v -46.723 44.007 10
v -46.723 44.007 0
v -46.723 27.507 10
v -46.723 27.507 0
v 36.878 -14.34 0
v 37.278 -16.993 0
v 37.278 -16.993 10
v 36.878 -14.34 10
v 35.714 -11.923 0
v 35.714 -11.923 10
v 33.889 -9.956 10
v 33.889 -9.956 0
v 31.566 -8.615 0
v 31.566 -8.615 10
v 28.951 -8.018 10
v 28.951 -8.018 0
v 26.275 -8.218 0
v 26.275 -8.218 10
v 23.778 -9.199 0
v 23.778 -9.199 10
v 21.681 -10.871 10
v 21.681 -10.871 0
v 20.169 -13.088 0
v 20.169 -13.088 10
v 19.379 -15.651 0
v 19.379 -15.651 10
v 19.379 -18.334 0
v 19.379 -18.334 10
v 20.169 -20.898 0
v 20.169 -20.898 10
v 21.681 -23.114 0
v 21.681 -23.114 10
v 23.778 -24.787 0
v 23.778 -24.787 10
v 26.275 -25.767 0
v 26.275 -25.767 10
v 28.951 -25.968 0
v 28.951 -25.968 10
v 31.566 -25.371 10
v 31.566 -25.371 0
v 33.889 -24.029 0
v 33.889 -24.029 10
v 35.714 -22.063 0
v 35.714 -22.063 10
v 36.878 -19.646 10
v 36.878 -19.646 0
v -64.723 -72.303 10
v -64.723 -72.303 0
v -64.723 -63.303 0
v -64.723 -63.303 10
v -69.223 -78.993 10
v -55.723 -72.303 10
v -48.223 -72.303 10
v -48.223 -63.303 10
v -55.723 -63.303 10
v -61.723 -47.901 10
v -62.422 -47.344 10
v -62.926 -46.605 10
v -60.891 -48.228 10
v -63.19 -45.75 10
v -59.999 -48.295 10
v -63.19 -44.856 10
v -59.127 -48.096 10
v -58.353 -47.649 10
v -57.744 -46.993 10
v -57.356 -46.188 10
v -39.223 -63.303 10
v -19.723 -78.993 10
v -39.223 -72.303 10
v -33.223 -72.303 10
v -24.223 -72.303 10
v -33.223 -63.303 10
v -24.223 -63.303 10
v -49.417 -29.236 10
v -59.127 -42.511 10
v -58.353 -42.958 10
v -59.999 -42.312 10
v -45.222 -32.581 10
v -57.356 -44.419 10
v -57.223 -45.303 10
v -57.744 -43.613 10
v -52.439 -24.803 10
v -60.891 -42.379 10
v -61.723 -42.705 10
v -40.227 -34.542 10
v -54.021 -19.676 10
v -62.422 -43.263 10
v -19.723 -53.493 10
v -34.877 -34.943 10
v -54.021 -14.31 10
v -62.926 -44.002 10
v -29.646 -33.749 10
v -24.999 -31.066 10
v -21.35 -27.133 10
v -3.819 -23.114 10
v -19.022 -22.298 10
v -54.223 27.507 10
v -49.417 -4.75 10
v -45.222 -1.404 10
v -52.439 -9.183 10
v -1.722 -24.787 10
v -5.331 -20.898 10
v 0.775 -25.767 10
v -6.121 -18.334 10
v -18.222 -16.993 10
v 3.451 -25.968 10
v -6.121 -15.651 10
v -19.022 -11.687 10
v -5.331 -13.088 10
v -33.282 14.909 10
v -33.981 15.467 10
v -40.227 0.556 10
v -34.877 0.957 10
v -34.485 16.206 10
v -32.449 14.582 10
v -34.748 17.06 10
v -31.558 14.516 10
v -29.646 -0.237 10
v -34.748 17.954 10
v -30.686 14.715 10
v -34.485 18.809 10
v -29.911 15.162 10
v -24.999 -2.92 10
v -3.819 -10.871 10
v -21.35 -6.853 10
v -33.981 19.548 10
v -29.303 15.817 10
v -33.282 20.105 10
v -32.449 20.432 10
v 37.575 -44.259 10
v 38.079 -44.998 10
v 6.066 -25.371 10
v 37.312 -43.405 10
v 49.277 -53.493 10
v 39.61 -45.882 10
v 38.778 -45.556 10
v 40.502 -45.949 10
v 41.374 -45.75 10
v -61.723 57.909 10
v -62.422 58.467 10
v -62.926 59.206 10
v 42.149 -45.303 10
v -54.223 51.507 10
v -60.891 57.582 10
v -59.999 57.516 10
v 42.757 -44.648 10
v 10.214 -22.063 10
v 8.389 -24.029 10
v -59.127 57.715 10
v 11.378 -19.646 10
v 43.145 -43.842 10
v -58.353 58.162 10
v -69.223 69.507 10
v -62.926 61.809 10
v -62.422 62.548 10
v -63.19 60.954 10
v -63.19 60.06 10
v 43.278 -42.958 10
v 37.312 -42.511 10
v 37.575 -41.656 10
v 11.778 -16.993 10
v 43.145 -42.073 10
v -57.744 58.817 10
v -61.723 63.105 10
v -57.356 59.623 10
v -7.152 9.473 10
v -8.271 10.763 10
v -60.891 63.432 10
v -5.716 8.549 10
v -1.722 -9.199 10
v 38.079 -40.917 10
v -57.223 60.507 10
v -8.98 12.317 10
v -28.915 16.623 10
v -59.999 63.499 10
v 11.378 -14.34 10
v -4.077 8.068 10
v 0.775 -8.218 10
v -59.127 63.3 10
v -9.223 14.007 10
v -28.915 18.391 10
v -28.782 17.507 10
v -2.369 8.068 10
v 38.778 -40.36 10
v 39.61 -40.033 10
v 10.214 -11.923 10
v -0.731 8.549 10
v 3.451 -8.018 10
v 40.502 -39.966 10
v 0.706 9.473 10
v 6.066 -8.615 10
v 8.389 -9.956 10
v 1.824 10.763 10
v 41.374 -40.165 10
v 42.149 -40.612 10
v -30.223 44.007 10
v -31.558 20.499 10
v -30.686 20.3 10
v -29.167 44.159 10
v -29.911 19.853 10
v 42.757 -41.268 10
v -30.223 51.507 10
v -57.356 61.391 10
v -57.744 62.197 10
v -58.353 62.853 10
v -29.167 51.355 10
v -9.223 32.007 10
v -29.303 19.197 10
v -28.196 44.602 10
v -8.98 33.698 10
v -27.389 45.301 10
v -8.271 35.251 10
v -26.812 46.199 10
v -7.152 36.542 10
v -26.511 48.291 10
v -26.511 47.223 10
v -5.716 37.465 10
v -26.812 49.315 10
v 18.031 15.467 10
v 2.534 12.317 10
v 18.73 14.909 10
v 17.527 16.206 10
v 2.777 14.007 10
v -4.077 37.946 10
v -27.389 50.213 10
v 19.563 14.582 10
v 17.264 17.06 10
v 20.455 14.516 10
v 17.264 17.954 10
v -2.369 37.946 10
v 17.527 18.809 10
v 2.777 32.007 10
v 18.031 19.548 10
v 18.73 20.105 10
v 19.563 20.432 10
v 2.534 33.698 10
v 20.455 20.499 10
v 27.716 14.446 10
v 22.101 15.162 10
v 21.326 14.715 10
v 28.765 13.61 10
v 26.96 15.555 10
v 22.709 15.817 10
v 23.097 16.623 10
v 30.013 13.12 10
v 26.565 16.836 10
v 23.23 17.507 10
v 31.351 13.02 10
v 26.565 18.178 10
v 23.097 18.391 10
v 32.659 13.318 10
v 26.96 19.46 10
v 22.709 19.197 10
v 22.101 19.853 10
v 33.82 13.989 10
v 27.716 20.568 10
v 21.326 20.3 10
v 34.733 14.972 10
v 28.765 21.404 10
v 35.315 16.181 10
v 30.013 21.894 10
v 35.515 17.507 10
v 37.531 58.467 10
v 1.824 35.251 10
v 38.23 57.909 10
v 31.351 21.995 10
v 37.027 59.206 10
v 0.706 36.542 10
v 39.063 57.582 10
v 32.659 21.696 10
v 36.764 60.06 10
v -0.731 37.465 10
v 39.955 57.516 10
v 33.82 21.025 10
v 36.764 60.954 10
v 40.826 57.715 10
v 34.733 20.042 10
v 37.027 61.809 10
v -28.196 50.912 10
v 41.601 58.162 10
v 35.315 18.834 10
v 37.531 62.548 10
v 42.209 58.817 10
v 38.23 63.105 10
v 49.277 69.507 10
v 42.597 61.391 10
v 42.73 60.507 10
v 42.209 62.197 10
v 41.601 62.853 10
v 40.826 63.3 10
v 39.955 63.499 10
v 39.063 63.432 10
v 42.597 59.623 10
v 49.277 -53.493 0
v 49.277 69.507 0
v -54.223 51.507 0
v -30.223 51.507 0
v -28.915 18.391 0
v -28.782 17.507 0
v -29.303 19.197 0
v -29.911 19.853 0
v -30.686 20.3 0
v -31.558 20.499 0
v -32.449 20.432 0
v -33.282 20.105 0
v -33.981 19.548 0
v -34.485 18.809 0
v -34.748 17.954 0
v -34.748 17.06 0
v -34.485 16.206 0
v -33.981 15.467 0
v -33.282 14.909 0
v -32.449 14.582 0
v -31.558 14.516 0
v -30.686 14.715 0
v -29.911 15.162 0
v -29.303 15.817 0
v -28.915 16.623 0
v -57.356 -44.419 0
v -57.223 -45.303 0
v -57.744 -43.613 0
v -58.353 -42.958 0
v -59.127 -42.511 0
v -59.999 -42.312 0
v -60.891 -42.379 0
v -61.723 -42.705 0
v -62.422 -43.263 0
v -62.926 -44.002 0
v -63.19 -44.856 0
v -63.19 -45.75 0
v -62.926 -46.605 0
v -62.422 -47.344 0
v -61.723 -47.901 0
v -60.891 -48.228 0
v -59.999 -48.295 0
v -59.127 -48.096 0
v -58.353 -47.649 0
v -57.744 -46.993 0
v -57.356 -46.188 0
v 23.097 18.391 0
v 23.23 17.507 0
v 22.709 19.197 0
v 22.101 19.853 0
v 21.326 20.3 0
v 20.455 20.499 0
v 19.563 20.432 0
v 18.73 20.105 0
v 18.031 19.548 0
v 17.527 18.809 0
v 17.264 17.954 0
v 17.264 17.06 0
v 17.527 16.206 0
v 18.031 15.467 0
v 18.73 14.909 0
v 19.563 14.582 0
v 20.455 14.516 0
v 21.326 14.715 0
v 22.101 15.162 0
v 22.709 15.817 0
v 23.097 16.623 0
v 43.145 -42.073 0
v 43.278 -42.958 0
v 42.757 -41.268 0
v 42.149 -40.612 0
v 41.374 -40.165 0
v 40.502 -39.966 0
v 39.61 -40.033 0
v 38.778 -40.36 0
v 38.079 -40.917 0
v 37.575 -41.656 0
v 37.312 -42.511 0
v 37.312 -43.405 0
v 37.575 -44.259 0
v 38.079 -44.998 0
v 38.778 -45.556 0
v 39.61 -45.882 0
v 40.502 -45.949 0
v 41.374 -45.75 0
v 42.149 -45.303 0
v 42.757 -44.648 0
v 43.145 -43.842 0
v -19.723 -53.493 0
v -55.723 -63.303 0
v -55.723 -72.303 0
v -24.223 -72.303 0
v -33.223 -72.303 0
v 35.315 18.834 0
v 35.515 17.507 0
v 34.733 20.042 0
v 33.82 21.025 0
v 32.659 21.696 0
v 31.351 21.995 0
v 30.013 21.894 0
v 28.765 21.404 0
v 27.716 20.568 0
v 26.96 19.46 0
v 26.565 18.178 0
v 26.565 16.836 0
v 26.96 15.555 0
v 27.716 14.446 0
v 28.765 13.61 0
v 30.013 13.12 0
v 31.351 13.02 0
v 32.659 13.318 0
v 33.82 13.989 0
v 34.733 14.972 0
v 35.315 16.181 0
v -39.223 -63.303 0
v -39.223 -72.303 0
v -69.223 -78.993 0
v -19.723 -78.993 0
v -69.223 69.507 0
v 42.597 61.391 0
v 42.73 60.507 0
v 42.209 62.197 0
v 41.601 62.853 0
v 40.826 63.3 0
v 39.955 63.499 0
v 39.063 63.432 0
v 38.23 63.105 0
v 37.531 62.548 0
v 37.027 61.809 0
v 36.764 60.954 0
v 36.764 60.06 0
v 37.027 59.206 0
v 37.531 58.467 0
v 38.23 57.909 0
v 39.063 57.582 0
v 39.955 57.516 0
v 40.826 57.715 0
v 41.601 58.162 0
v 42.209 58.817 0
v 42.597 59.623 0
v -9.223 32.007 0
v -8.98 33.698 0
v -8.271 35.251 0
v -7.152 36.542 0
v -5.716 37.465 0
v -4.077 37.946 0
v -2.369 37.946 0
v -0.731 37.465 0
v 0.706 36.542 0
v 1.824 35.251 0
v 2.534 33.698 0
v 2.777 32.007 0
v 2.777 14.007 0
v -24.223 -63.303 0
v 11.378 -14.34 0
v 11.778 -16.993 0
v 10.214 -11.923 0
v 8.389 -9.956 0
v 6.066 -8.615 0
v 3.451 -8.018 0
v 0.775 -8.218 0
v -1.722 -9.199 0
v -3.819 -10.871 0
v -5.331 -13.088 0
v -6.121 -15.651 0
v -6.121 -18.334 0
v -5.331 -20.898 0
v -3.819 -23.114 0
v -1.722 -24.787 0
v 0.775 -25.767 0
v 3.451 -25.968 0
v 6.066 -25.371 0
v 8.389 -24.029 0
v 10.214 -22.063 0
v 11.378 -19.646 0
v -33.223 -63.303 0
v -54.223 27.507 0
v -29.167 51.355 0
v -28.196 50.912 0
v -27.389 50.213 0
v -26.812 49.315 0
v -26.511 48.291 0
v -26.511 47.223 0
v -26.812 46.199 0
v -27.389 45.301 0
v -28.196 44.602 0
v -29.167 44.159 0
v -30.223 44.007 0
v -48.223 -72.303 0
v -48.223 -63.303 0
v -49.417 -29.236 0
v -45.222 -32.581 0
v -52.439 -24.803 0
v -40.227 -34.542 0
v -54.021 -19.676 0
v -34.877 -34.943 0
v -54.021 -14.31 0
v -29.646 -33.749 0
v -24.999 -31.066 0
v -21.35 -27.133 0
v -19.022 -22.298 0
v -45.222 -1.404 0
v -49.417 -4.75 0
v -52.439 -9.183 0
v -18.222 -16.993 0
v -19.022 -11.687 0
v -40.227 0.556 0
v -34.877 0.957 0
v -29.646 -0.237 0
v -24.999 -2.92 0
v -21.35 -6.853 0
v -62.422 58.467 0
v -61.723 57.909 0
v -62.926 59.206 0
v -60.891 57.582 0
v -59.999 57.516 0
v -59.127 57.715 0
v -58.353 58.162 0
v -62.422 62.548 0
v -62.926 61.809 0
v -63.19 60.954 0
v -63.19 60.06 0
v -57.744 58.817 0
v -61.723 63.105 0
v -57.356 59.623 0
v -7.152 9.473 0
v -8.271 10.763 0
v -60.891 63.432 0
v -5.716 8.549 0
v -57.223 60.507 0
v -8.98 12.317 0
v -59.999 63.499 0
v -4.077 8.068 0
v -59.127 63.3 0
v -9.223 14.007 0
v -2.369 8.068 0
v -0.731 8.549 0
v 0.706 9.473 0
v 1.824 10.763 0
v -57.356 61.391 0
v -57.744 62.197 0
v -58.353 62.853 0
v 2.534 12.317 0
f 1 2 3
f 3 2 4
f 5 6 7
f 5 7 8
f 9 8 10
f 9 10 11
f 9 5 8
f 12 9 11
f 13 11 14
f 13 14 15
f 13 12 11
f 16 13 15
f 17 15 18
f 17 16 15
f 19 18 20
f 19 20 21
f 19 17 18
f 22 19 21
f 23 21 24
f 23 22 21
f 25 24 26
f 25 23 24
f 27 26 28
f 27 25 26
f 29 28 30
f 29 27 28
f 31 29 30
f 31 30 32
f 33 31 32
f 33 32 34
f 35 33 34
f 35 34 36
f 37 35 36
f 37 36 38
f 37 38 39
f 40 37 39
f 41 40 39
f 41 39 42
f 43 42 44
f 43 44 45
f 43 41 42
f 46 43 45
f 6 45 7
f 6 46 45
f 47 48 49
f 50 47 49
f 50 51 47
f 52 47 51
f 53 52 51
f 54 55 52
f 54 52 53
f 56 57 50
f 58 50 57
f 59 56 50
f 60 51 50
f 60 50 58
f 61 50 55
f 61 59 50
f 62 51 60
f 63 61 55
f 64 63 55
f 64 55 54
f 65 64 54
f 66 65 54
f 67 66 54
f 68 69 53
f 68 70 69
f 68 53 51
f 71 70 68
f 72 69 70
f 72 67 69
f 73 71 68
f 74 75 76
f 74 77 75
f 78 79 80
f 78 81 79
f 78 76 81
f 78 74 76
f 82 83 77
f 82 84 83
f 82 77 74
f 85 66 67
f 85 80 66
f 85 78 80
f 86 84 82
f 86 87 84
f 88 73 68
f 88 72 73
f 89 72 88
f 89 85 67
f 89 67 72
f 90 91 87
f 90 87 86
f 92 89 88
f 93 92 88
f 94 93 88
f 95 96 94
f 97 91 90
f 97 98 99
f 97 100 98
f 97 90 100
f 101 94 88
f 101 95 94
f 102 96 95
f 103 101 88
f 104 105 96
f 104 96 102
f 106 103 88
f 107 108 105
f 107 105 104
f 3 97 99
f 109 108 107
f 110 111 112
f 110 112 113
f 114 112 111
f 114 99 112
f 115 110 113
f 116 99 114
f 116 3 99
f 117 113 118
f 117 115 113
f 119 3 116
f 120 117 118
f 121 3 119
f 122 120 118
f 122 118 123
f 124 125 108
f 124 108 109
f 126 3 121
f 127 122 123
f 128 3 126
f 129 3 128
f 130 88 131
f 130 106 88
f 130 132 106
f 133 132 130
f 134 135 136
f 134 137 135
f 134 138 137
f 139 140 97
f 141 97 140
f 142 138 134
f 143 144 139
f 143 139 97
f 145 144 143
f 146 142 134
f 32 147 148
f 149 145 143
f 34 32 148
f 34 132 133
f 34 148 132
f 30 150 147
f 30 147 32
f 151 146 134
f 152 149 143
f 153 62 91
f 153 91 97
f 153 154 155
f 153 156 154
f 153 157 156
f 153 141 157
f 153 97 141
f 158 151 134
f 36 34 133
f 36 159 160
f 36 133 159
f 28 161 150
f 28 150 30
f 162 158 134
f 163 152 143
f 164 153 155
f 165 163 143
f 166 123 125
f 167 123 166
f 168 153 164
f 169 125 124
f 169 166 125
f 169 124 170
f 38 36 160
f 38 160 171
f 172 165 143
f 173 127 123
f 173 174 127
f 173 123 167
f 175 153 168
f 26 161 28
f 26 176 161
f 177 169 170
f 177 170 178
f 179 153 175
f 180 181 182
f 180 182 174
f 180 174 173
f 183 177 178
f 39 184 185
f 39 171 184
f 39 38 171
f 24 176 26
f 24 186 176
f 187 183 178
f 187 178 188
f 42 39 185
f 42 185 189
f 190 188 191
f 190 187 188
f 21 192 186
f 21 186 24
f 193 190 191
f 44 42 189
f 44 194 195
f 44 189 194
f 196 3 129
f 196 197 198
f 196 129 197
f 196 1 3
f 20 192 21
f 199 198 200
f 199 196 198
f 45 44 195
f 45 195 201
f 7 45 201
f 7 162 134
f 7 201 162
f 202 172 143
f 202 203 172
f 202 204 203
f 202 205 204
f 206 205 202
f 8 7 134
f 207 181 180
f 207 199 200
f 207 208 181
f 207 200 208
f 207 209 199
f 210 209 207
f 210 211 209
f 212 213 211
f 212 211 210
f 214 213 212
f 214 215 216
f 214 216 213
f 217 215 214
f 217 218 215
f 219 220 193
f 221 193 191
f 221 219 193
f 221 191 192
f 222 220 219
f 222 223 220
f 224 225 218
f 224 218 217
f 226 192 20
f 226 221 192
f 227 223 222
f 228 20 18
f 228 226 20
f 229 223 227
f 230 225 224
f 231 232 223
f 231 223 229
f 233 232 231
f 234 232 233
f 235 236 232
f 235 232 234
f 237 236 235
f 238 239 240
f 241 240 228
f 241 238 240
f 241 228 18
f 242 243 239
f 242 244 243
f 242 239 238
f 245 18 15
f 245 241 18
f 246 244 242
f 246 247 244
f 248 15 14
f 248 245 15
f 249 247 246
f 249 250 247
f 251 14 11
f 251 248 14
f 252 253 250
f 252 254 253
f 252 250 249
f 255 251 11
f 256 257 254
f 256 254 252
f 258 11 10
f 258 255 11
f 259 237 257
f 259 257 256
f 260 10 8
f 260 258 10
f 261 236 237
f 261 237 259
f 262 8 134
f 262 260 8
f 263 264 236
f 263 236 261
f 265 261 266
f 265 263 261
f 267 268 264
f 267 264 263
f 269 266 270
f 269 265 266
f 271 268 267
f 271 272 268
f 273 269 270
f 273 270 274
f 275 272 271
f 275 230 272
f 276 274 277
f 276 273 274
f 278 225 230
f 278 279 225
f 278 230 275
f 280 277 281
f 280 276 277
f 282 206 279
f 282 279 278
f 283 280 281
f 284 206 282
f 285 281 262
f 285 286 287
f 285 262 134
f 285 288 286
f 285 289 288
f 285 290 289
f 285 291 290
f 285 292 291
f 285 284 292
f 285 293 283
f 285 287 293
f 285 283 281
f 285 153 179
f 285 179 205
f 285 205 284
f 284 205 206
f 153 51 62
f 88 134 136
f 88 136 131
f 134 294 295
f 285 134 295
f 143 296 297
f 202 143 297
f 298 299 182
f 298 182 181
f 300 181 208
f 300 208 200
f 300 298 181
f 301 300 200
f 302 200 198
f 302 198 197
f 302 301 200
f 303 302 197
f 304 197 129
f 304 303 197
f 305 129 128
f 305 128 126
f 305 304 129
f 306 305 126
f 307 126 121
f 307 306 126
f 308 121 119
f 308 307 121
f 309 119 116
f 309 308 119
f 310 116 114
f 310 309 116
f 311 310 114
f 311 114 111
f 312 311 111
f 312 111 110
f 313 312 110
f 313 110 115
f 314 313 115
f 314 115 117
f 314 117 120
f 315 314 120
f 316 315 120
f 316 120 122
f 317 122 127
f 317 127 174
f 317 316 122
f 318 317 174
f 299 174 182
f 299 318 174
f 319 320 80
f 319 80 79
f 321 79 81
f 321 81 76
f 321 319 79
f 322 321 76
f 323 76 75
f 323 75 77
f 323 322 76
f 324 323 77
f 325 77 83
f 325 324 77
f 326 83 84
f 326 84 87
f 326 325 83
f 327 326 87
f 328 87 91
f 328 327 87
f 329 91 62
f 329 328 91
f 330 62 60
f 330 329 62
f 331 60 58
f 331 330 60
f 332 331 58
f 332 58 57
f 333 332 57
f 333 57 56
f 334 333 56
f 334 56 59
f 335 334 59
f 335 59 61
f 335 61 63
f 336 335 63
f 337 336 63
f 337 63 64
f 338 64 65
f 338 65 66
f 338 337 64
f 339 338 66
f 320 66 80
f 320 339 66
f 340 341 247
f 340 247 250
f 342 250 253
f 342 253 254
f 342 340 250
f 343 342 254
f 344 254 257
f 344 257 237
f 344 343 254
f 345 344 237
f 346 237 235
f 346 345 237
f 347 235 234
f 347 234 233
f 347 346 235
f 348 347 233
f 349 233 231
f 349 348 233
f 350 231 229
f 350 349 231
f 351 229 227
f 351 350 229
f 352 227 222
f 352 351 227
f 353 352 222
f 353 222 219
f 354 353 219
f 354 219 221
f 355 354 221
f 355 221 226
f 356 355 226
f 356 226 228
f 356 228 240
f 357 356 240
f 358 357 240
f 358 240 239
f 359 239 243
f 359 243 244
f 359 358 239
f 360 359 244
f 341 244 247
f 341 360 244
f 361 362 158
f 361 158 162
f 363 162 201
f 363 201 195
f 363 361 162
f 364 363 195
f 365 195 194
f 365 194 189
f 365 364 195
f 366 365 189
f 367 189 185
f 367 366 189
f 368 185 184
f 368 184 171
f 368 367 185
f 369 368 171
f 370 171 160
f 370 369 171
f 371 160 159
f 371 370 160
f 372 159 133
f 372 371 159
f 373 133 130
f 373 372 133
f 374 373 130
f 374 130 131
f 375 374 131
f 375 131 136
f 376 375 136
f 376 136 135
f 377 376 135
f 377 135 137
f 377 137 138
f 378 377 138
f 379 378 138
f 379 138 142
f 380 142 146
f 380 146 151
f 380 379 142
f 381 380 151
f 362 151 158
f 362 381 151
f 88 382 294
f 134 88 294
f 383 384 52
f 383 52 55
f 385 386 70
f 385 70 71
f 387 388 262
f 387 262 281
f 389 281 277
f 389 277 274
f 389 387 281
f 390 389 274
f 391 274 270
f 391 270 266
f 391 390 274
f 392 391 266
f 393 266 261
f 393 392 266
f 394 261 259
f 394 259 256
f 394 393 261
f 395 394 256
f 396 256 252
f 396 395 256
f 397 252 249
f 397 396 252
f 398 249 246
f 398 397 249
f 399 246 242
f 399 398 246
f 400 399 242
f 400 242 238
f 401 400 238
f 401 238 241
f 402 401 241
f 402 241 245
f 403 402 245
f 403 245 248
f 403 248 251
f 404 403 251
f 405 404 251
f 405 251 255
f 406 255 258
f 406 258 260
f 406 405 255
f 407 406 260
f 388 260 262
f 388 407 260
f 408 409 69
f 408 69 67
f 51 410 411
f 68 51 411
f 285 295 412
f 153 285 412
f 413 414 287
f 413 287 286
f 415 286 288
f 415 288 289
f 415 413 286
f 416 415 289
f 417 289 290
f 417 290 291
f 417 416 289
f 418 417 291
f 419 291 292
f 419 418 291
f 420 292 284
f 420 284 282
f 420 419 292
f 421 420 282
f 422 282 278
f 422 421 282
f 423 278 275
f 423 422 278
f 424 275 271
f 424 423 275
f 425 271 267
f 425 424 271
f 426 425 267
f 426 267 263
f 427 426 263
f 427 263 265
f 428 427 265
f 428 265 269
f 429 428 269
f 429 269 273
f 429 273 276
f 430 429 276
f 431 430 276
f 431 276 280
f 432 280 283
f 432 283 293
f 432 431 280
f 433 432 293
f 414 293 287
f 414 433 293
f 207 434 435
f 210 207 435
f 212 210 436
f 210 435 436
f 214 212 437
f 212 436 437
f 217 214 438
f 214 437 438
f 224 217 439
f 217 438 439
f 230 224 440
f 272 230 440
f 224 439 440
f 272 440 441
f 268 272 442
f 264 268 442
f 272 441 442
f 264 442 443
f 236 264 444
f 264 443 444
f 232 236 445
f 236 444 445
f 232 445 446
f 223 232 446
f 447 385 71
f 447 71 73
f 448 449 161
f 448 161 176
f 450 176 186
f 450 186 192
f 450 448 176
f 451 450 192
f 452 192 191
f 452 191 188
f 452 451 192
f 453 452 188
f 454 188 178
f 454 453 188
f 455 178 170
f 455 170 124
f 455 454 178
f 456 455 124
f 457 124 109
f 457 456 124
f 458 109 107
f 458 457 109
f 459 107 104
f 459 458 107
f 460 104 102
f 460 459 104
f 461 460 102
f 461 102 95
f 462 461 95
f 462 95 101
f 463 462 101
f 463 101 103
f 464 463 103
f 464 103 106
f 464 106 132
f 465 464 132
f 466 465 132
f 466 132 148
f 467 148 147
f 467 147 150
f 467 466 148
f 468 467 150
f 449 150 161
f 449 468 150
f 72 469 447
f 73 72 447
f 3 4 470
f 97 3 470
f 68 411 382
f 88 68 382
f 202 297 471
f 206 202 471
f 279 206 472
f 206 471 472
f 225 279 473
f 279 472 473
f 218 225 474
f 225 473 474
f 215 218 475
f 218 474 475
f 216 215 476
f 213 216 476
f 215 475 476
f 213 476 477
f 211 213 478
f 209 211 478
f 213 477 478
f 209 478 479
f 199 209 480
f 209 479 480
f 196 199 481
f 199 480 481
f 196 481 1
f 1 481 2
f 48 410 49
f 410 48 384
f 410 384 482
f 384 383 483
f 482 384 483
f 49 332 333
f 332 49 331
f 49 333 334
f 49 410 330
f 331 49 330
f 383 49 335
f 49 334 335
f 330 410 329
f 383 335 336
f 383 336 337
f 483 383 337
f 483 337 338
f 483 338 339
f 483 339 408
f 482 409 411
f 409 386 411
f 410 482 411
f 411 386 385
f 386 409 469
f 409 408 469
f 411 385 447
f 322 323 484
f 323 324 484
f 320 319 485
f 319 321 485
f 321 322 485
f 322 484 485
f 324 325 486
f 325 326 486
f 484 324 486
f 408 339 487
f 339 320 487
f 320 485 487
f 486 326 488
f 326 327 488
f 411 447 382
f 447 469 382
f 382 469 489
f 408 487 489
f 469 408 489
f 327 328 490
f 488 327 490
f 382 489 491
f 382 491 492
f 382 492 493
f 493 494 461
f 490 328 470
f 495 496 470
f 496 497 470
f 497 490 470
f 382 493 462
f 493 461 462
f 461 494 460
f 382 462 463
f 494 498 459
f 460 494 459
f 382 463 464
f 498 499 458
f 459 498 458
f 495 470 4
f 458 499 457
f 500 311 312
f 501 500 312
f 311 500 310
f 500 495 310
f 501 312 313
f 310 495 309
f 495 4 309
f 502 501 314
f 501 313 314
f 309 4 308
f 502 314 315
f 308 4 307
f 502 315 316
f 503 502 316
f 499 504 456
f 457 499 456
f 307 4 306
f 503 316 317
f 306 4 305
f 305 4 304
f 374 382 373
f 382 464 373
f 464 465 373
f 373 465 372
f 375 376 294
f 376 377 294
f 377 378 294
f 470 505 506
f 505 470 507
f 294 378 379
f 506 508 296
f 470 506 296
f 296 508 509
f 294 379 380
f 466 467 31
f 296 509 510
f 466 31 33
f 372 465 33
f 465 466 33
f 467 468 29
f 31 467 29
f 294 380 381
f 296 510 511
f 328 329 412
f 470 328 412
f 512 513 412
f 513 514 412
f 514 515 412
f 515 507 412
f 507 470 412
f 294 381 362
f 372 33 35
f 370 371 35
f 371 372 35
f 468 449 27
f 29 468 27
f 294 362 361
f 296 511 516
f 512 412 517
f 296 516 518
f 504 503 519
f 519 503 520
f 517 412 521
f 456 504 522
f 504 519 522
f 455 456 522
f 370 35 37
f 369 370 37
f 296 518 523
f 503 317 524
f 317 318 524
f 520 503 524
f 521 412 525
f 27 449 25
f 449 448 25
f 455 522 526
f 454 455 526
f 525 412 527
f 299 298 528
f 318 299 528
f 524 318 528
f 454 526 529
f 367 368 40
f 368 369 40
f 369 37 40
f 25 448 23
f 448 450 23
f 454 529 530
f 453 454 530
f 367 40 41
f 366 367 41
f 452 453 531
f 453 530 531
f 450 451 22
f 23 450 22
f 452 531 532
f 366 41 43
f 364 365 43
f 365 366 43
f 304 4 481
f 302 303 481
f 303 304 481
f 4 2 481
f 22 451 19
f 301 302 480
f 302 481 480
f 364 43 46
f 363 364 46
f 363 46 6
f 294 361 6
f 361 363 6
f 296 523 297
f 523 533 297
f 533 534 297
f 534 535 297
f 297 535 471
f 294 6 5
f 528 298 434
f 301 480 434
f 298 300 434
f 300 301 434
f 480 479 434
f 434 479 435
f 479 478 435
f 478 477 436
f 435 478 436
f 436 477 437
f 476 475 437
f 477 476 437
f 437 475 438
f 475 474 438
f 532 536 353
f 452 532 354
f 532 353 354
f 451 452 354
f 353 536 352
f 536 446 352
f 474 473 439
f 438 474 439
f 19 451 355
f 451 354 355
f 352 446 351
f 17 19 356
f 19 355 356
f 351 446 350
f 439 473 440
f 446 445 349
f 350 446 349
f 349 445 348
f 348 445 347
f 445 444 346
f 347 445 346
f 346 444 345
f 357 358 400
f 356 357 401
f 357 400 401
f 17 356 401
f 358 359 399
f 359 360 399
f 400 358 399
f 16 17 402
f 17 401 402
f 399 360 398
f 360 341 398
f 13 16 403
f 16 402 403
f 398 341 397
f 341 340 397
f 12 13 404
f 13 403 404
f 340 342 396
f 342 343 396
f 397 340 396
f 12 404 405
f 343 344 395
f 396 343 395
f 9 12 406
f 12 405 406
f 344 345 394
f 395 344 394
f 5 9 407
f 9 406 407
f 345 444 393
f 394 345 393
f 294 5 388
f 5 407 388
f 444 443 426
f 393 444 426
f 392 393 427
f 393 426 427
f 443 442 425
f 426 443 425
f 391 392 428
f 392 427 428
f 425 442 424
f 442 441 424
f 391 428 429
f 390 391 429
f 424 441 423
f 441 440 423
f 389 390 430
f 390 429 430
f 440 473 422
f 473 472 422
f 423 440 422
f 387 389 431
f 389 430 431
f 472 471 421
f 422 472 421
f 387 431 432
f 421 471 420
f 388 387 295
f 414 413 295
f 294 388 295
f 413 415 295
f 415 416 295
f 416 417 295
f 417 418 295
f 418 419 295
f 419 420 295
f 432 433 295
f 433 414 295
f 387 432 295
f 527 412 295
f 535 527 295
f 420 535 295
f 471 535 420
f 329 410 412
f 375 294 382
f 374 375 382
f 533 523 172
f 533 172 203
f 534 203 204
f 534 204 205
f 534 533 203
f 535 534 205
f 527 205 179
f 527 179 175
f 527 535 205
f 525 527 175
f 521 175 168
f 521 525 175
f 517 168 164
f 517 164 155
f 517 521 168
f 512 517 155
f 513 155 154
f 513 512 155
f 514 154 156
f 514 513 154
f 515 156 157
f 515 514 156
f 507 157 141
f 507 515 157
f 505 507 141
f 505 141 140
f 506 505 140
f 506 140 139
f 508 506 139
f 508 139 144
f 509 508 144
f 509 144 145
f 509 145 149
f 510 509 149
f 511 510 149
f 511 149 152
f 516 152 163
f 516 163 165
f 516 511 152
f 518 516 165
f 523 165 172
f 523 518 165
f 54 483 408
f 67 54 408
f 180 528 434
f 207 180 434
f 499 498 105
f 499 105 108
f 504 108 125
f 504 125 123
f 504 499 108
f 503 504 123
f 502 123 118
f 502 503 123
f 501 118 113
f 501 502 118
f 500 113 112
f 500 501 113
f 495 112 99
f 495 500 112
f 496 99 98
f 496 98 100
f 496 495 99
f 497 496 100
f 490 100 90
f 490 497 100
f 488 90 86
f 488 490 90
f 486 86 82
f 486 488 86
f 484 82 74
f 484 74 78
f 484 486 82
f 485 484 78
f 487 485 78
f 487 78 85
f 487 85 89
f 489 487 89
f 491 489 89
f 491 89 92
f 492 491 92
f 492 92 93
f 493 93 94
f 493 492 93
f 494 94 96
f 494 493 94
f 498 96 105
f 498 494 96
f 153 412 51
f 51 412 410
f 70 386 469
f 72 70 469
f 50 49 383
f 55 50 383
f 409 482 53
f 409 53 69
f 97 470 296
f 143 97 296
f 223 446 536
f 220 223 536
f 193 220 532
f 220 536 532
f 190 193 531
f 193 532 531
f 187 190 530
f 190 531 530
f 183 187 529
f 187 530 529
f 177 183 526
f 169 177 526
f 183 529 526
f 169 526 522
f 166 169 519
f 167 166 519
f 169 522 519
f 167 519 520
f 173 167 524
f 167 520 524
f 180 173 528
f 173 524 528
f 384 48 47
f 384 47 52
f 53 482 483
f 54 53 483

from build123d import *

# Parameters (mm, degrees)
F0_W     = 9
F0_H     = 9
F0_R     = 3
F0_R_2   = 18
F0_R_3   = 9
F0_R_4   = 4.5
F1_DEPTH = 10


with BuildPart() as f1:
    # F0 (on Top) → F1 (new body)
    with BuildSketch(Plane.XY):
        Polygon((49.276882, 69.50716), (-69.223118, 69.50716), (-69.223118, -78.99284), (-19.723118, -78.99284), (-19.723118, -53.49284), (49.276882, -53.49284), align=None)
        with Locations((-60.223118, -67.803344)):
            Rectangle(F0_W, F0_H, mode=Mode.SUBTRACT)
        with Locations((-43.723118, -67.803344)):
            Rectangle(F0_W, F0_H, mode=Mode.SUBTRACT)
        with Locations((-60.223118, -45.303344)):
            Circle(F0_R, mode=Mode.SUBTRACT)
        with Locations((-28.723118, -67.803344)):
            Rectangle(F0_W, F0_H, mode=Mode.SUBTRACT)
        with Locations((-36.221969, -16.99284)):
            Circle(F0_R_2, mode=Mode.SUBTRACT)
        with Locations((40.278031, -42.957689)):
            Circle(F0_R, mode=Mode.SUBTRACT)
        with Locations((2.778031, -16.99284)):
            Circle(F0_R_3, mode=Mode.SUBTRACT)
        with Locations((28.278031, -16.99284)):
            Circle(F0_R_3, mode=Mode.SUBTRACT)
        with Locations((-31.781744, 17.50716)):
            Circle(F0_R, mode=Mode.SUBTRACT)
        with BuildLine():
            Line((-54.223118, 27.50716), (-54.223118, 51.50716))
            Line((-54.223118, 51.50716), (-30.223118, 51.50716))
            ThreePointArc((-30.223118, 51.50716), (-26.473118, 47.75716), (-30.223118, 44.00716))
            Line((-30.223118, 44.00716), (-46.723118, 44.00716))
            Line((-46.723118, 44.00716), (-46.723118, 27.50716))
            Line((-46.723118, 27.50716), (-54.223118, 27.50716))
        make_face(mode=Mode.SUBTRACT)
        with Locations((-60.223118, 60.50716)):
            Circle(F0_R, mode=Mode.SUBTRACT)
        with BuildLine():
            Line((-9.223118, 14.00716), (-9.223118, 32.00716))
            ThreePointArc((-9.223118, 32.00716), (-3.223118, 38.00716), (2.776882, 32.00716))
            Line((2.776882, 32.00716), (2.776882, 14.00716))
            ThreePointArc((2.776882, 14.00716), (-3.223118, 8.00716), (-9.223118, 14.00716))
        make_face(mode=Mode.SUBTRACT)
        with Locations((20.23034, 17.50716)):
            Circle(F0_R, mode=Mode.SUBTRACT)
        with Locations((31.014569, 17.50716)):
            Circle(F0_R_4, mode=Mode.SUBTRACT)
        with Locations((39.73034, 60.50716)):
            Circle(F0_R, mode=Mode.SUBTRACT)
    extrude(amount=F1_DEPTH)


solid = f1.part
